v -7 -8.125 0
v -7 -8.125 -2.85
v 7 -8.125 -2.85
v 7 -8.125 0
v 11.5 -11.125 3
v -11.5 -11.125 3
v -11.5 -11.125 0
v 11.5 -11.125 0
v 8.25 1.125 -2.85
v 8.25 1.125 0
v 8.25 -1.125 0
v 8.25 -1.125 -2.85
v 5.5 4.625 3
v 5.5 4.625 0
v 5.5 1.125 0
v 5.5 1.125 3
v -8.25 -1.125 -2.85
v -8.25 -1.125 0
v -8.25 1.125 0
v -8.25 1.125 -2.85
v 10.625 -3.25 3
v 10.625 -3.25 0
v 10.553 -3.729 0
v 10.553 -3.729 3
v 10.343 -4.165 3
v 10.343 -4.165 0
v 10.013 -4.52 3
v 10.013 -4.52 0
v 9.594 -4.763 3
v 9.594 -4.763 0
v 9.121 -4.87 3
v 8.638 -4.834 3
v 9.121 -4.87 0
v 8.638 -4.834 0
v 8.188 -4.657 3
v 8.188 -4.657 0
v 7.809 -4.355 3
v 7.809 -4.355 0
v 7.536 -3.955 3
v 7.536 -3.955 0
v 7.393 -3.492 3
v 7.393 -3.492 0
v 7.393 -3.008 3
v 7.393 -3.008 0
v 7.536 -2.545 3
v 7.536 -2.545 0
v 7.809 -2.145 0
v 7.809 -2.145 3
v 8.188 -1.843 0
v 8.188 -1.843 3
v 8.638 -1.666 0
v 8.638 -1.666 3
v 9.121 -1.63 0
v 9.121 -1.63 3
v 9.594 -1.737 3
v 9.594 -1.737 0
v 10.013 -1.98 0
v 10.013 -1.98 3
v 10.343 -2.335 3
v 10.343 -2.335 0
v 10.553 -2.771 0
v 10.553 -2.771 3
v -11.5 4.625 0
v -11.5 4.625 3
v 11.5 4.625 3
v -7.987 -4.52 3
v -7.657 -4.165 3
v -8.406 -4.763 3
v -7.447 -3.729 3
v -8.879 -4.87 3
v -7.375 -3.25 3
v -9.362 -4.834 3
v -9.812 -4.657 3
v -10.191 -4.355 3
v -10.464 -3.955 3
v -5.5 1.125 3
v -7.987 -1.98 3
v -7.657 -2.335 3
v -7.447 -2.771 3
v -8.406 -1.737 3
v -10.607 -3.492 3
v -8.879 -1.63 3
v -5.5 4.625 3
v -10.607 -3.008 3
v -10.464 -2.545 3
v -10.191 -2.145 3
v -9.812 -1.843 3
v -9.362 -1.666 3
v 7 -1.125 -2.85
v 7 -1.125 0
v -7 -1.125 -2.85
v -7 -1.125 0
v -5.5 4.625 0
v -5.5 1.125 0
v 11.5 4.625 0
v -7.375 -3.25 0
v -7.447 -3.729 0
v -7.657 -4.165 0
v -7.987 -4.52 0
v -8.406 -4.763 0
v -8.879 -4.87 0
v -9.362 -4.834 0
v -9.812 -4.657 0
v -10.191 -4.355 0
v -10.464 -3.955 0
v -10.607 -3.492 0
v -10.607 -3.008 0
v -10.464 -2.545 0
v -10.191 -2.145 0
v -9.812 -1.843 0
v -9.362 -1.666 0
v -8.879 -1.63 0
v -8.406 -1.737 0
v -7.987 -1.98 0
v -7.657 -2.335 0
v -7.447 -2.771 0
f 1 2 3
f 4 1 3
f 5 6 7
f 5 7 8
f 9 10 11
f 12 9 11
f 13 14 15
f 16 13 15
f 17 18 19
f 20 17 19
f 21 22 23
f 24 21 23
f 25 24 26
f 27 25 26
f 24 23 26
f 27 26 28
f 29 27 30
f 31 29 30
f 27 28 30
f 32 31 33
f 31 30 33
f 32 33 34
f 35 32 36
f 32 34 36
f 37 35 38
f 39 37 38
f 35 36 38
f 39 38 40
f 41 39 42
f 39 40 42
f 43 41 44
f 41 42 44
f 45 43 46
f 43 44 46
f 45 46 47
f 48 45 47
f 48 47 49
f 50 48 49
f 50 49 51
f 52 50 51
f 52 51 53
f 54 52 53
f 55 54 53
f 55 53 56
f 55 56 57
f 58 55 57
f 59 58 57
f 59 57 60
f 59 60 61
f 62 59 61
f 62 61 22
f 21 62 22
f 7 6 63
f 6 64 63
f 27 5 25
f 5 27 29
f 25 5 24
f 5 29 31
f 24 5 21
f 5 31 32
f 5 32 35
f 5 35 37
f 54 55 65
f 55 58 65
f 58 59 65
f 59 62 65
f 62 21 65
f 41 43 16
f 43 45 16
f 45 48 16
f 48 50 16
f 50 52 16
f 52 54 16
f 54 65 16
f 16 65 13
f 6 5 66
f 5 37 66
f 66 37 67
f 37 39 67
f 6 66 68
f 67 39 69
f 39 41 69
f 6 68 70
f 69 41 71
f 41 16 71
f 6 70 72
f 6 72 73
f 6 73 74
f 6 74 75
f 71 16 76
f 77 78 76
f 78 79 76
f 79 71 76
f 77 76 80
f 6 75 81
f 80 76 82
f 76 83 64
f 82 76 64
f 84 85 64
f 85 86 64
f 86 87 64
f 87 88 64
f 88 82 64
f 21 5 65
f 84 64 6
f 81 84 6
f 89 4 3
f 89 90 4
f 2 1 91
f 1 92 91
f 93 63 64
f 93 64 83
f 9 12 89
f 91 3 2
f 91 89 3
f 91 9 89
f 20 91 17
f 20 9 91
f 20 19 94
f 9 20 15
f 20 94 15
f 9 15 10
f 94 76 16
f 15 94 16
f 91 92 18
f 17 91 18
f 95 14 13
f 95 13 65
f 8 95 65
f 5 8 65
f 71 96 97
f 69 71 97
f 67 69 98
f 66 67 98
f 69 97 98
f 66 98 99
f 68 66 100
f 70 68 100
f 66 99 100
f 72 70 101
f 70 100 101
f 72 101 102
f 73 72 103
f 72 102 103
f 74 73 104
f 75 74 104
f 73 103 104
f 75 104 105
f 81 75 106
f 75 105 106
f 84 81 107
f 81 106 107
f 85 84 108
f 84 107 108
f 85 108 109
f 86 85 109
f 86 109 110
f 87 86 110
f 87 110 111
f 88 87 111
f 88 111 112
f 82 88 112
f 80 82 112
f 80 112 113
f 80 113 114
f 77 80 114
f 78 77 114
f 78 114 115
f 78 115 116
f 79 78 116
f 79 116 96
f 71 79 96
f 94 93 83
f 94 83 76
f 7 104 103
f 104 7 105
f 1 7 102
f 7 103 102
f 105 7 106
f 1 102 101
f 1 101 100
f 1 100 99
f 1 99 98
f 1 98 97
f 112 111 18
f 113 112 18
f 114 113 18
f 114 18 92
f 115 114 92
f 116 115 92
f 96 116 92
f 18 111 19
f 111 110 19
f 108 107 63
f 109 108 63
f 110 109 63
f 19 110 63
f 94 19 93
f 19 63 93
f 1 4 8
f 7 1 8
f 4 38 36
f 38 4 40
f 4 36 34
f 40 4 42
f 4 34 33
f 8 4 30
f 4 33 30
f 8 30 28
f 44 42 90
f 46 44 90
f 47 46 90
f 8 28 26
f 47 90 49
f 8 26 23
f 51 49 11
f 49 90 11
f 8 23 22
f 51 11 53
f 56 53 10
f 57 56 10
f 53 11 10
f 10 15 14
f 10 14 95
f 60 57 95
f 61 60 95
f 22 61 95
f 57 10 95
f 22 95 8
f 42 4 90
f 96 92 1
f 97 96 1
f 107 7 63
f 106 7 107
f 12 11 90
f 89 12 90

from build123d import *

# Parameters (mm, degrees)
F0_W      = 23
F0_H      = 9.25
F1_DEPTH  = 3
F3_DEPTH  = 3.6
F4_W      = 11
F4_H      = 3.5
F5_DEPTH  = 6.601
F7_DEPTH  = 0.75
F8_DEPTH  = 3.501
F9_DEPTH  = 3.5
F11_DEPTH = 3
F12_R     = 1.625
F13_DEPTH = 3.001


with BuildPart() as f1:
    # F0 (on Top) → F1 (new body)
    with BuildSketch(Plane.XY):
        Rectangle(F0_W, F0_H)
    extrude(amount=F1_DEPTH)

    # F2 (on face) → F3 (join)
    with BuildSketch(Plane(origin=(0, 0, 0), x_dir=(1, 0, 0), z_dir=(0, 0, -1))):
        Polygon((7, 4.625), (-7, 4.625), (-7, 1.125), (-8.25, 1.125), (-8.25, -1.125), (-5.5, -1.125), (-5.5, -4.625), (5.5, -4.625), (5.5, -1.125), (8.25, -1.125), (8.25, 1.125), (7, 1.125), align=None)
    extrude(amount=F3_DEPTH)

    # F4 (on face) → F5 (cut, through all)
    with BuildSketch(Plane(origin=(0, 0, -3.6), x_dir=(1, 0, 0), z_dir=(0, 0, -1))):
        with Locations((0, -2.875)):
            Rectangle(F4_W, F4_H)
    extrude(amount=-F5_DEPTH, mode=Mode.SUBTRACT)

    # F6 (on face) → F7 (cut)
    with BuildSketch(Plane(origin=(0, 0, -3.6), x_dir=(1, 0, 0), z_dir=(0, 0, -1))):
        Polygon((-8.25, -1.125), (8.25, -1.125), (8.25, 1.125), (7, 1.125), (-7, 1.125), (-8.25, 1.125), align=None)
    extrude(amount=-F7_DEPTH, mode=Mode.SUBTRACT)

    # F8 (cut, through all): a face of the model
    f8_faces = [f1.faces().sort_by_distance(p)[0] for p in [
        (0, -1.125, -3.225),
    ]]
    extrude(f8_faces, amount=-F8_DEPTH, mode=Mode.SUBTRACT)

    # F9 (add): a face of the model
    f9_faces = [f1.faces().sort_by_distance(p)[0] for p in [
        (0, -4.625, 0.4283057851),
    ]]
    extrude(f9_faces, amount=F9_DEPTH)

    # F10 (on face) → F11 (join)
    with BuildSketch(Plane.XZ.offset(8.125)):
        Polygon((11.5, 3), (-11.5, 3), (-11.5, 0), (-7, 0), (7, 0), (11.5, 0), align=None)
    extrude(amount=F11_DEPTH)

    # F12 (on face) → F13 (cut, through all)
    with BuildSketch(Plane(origin=(0, 0, 0), x_dir=(1, 0, 0), z_dir=(0, 0, -1))):
        with Locations((-9, 3.25)):
            Circle(F12_R)
        with Locations((9, 3.25)):
            Circle(F12_R)
    extrude(amount=-F13_DEPTH, mode=Mode.SUBTRACT)


solid = f1.part
